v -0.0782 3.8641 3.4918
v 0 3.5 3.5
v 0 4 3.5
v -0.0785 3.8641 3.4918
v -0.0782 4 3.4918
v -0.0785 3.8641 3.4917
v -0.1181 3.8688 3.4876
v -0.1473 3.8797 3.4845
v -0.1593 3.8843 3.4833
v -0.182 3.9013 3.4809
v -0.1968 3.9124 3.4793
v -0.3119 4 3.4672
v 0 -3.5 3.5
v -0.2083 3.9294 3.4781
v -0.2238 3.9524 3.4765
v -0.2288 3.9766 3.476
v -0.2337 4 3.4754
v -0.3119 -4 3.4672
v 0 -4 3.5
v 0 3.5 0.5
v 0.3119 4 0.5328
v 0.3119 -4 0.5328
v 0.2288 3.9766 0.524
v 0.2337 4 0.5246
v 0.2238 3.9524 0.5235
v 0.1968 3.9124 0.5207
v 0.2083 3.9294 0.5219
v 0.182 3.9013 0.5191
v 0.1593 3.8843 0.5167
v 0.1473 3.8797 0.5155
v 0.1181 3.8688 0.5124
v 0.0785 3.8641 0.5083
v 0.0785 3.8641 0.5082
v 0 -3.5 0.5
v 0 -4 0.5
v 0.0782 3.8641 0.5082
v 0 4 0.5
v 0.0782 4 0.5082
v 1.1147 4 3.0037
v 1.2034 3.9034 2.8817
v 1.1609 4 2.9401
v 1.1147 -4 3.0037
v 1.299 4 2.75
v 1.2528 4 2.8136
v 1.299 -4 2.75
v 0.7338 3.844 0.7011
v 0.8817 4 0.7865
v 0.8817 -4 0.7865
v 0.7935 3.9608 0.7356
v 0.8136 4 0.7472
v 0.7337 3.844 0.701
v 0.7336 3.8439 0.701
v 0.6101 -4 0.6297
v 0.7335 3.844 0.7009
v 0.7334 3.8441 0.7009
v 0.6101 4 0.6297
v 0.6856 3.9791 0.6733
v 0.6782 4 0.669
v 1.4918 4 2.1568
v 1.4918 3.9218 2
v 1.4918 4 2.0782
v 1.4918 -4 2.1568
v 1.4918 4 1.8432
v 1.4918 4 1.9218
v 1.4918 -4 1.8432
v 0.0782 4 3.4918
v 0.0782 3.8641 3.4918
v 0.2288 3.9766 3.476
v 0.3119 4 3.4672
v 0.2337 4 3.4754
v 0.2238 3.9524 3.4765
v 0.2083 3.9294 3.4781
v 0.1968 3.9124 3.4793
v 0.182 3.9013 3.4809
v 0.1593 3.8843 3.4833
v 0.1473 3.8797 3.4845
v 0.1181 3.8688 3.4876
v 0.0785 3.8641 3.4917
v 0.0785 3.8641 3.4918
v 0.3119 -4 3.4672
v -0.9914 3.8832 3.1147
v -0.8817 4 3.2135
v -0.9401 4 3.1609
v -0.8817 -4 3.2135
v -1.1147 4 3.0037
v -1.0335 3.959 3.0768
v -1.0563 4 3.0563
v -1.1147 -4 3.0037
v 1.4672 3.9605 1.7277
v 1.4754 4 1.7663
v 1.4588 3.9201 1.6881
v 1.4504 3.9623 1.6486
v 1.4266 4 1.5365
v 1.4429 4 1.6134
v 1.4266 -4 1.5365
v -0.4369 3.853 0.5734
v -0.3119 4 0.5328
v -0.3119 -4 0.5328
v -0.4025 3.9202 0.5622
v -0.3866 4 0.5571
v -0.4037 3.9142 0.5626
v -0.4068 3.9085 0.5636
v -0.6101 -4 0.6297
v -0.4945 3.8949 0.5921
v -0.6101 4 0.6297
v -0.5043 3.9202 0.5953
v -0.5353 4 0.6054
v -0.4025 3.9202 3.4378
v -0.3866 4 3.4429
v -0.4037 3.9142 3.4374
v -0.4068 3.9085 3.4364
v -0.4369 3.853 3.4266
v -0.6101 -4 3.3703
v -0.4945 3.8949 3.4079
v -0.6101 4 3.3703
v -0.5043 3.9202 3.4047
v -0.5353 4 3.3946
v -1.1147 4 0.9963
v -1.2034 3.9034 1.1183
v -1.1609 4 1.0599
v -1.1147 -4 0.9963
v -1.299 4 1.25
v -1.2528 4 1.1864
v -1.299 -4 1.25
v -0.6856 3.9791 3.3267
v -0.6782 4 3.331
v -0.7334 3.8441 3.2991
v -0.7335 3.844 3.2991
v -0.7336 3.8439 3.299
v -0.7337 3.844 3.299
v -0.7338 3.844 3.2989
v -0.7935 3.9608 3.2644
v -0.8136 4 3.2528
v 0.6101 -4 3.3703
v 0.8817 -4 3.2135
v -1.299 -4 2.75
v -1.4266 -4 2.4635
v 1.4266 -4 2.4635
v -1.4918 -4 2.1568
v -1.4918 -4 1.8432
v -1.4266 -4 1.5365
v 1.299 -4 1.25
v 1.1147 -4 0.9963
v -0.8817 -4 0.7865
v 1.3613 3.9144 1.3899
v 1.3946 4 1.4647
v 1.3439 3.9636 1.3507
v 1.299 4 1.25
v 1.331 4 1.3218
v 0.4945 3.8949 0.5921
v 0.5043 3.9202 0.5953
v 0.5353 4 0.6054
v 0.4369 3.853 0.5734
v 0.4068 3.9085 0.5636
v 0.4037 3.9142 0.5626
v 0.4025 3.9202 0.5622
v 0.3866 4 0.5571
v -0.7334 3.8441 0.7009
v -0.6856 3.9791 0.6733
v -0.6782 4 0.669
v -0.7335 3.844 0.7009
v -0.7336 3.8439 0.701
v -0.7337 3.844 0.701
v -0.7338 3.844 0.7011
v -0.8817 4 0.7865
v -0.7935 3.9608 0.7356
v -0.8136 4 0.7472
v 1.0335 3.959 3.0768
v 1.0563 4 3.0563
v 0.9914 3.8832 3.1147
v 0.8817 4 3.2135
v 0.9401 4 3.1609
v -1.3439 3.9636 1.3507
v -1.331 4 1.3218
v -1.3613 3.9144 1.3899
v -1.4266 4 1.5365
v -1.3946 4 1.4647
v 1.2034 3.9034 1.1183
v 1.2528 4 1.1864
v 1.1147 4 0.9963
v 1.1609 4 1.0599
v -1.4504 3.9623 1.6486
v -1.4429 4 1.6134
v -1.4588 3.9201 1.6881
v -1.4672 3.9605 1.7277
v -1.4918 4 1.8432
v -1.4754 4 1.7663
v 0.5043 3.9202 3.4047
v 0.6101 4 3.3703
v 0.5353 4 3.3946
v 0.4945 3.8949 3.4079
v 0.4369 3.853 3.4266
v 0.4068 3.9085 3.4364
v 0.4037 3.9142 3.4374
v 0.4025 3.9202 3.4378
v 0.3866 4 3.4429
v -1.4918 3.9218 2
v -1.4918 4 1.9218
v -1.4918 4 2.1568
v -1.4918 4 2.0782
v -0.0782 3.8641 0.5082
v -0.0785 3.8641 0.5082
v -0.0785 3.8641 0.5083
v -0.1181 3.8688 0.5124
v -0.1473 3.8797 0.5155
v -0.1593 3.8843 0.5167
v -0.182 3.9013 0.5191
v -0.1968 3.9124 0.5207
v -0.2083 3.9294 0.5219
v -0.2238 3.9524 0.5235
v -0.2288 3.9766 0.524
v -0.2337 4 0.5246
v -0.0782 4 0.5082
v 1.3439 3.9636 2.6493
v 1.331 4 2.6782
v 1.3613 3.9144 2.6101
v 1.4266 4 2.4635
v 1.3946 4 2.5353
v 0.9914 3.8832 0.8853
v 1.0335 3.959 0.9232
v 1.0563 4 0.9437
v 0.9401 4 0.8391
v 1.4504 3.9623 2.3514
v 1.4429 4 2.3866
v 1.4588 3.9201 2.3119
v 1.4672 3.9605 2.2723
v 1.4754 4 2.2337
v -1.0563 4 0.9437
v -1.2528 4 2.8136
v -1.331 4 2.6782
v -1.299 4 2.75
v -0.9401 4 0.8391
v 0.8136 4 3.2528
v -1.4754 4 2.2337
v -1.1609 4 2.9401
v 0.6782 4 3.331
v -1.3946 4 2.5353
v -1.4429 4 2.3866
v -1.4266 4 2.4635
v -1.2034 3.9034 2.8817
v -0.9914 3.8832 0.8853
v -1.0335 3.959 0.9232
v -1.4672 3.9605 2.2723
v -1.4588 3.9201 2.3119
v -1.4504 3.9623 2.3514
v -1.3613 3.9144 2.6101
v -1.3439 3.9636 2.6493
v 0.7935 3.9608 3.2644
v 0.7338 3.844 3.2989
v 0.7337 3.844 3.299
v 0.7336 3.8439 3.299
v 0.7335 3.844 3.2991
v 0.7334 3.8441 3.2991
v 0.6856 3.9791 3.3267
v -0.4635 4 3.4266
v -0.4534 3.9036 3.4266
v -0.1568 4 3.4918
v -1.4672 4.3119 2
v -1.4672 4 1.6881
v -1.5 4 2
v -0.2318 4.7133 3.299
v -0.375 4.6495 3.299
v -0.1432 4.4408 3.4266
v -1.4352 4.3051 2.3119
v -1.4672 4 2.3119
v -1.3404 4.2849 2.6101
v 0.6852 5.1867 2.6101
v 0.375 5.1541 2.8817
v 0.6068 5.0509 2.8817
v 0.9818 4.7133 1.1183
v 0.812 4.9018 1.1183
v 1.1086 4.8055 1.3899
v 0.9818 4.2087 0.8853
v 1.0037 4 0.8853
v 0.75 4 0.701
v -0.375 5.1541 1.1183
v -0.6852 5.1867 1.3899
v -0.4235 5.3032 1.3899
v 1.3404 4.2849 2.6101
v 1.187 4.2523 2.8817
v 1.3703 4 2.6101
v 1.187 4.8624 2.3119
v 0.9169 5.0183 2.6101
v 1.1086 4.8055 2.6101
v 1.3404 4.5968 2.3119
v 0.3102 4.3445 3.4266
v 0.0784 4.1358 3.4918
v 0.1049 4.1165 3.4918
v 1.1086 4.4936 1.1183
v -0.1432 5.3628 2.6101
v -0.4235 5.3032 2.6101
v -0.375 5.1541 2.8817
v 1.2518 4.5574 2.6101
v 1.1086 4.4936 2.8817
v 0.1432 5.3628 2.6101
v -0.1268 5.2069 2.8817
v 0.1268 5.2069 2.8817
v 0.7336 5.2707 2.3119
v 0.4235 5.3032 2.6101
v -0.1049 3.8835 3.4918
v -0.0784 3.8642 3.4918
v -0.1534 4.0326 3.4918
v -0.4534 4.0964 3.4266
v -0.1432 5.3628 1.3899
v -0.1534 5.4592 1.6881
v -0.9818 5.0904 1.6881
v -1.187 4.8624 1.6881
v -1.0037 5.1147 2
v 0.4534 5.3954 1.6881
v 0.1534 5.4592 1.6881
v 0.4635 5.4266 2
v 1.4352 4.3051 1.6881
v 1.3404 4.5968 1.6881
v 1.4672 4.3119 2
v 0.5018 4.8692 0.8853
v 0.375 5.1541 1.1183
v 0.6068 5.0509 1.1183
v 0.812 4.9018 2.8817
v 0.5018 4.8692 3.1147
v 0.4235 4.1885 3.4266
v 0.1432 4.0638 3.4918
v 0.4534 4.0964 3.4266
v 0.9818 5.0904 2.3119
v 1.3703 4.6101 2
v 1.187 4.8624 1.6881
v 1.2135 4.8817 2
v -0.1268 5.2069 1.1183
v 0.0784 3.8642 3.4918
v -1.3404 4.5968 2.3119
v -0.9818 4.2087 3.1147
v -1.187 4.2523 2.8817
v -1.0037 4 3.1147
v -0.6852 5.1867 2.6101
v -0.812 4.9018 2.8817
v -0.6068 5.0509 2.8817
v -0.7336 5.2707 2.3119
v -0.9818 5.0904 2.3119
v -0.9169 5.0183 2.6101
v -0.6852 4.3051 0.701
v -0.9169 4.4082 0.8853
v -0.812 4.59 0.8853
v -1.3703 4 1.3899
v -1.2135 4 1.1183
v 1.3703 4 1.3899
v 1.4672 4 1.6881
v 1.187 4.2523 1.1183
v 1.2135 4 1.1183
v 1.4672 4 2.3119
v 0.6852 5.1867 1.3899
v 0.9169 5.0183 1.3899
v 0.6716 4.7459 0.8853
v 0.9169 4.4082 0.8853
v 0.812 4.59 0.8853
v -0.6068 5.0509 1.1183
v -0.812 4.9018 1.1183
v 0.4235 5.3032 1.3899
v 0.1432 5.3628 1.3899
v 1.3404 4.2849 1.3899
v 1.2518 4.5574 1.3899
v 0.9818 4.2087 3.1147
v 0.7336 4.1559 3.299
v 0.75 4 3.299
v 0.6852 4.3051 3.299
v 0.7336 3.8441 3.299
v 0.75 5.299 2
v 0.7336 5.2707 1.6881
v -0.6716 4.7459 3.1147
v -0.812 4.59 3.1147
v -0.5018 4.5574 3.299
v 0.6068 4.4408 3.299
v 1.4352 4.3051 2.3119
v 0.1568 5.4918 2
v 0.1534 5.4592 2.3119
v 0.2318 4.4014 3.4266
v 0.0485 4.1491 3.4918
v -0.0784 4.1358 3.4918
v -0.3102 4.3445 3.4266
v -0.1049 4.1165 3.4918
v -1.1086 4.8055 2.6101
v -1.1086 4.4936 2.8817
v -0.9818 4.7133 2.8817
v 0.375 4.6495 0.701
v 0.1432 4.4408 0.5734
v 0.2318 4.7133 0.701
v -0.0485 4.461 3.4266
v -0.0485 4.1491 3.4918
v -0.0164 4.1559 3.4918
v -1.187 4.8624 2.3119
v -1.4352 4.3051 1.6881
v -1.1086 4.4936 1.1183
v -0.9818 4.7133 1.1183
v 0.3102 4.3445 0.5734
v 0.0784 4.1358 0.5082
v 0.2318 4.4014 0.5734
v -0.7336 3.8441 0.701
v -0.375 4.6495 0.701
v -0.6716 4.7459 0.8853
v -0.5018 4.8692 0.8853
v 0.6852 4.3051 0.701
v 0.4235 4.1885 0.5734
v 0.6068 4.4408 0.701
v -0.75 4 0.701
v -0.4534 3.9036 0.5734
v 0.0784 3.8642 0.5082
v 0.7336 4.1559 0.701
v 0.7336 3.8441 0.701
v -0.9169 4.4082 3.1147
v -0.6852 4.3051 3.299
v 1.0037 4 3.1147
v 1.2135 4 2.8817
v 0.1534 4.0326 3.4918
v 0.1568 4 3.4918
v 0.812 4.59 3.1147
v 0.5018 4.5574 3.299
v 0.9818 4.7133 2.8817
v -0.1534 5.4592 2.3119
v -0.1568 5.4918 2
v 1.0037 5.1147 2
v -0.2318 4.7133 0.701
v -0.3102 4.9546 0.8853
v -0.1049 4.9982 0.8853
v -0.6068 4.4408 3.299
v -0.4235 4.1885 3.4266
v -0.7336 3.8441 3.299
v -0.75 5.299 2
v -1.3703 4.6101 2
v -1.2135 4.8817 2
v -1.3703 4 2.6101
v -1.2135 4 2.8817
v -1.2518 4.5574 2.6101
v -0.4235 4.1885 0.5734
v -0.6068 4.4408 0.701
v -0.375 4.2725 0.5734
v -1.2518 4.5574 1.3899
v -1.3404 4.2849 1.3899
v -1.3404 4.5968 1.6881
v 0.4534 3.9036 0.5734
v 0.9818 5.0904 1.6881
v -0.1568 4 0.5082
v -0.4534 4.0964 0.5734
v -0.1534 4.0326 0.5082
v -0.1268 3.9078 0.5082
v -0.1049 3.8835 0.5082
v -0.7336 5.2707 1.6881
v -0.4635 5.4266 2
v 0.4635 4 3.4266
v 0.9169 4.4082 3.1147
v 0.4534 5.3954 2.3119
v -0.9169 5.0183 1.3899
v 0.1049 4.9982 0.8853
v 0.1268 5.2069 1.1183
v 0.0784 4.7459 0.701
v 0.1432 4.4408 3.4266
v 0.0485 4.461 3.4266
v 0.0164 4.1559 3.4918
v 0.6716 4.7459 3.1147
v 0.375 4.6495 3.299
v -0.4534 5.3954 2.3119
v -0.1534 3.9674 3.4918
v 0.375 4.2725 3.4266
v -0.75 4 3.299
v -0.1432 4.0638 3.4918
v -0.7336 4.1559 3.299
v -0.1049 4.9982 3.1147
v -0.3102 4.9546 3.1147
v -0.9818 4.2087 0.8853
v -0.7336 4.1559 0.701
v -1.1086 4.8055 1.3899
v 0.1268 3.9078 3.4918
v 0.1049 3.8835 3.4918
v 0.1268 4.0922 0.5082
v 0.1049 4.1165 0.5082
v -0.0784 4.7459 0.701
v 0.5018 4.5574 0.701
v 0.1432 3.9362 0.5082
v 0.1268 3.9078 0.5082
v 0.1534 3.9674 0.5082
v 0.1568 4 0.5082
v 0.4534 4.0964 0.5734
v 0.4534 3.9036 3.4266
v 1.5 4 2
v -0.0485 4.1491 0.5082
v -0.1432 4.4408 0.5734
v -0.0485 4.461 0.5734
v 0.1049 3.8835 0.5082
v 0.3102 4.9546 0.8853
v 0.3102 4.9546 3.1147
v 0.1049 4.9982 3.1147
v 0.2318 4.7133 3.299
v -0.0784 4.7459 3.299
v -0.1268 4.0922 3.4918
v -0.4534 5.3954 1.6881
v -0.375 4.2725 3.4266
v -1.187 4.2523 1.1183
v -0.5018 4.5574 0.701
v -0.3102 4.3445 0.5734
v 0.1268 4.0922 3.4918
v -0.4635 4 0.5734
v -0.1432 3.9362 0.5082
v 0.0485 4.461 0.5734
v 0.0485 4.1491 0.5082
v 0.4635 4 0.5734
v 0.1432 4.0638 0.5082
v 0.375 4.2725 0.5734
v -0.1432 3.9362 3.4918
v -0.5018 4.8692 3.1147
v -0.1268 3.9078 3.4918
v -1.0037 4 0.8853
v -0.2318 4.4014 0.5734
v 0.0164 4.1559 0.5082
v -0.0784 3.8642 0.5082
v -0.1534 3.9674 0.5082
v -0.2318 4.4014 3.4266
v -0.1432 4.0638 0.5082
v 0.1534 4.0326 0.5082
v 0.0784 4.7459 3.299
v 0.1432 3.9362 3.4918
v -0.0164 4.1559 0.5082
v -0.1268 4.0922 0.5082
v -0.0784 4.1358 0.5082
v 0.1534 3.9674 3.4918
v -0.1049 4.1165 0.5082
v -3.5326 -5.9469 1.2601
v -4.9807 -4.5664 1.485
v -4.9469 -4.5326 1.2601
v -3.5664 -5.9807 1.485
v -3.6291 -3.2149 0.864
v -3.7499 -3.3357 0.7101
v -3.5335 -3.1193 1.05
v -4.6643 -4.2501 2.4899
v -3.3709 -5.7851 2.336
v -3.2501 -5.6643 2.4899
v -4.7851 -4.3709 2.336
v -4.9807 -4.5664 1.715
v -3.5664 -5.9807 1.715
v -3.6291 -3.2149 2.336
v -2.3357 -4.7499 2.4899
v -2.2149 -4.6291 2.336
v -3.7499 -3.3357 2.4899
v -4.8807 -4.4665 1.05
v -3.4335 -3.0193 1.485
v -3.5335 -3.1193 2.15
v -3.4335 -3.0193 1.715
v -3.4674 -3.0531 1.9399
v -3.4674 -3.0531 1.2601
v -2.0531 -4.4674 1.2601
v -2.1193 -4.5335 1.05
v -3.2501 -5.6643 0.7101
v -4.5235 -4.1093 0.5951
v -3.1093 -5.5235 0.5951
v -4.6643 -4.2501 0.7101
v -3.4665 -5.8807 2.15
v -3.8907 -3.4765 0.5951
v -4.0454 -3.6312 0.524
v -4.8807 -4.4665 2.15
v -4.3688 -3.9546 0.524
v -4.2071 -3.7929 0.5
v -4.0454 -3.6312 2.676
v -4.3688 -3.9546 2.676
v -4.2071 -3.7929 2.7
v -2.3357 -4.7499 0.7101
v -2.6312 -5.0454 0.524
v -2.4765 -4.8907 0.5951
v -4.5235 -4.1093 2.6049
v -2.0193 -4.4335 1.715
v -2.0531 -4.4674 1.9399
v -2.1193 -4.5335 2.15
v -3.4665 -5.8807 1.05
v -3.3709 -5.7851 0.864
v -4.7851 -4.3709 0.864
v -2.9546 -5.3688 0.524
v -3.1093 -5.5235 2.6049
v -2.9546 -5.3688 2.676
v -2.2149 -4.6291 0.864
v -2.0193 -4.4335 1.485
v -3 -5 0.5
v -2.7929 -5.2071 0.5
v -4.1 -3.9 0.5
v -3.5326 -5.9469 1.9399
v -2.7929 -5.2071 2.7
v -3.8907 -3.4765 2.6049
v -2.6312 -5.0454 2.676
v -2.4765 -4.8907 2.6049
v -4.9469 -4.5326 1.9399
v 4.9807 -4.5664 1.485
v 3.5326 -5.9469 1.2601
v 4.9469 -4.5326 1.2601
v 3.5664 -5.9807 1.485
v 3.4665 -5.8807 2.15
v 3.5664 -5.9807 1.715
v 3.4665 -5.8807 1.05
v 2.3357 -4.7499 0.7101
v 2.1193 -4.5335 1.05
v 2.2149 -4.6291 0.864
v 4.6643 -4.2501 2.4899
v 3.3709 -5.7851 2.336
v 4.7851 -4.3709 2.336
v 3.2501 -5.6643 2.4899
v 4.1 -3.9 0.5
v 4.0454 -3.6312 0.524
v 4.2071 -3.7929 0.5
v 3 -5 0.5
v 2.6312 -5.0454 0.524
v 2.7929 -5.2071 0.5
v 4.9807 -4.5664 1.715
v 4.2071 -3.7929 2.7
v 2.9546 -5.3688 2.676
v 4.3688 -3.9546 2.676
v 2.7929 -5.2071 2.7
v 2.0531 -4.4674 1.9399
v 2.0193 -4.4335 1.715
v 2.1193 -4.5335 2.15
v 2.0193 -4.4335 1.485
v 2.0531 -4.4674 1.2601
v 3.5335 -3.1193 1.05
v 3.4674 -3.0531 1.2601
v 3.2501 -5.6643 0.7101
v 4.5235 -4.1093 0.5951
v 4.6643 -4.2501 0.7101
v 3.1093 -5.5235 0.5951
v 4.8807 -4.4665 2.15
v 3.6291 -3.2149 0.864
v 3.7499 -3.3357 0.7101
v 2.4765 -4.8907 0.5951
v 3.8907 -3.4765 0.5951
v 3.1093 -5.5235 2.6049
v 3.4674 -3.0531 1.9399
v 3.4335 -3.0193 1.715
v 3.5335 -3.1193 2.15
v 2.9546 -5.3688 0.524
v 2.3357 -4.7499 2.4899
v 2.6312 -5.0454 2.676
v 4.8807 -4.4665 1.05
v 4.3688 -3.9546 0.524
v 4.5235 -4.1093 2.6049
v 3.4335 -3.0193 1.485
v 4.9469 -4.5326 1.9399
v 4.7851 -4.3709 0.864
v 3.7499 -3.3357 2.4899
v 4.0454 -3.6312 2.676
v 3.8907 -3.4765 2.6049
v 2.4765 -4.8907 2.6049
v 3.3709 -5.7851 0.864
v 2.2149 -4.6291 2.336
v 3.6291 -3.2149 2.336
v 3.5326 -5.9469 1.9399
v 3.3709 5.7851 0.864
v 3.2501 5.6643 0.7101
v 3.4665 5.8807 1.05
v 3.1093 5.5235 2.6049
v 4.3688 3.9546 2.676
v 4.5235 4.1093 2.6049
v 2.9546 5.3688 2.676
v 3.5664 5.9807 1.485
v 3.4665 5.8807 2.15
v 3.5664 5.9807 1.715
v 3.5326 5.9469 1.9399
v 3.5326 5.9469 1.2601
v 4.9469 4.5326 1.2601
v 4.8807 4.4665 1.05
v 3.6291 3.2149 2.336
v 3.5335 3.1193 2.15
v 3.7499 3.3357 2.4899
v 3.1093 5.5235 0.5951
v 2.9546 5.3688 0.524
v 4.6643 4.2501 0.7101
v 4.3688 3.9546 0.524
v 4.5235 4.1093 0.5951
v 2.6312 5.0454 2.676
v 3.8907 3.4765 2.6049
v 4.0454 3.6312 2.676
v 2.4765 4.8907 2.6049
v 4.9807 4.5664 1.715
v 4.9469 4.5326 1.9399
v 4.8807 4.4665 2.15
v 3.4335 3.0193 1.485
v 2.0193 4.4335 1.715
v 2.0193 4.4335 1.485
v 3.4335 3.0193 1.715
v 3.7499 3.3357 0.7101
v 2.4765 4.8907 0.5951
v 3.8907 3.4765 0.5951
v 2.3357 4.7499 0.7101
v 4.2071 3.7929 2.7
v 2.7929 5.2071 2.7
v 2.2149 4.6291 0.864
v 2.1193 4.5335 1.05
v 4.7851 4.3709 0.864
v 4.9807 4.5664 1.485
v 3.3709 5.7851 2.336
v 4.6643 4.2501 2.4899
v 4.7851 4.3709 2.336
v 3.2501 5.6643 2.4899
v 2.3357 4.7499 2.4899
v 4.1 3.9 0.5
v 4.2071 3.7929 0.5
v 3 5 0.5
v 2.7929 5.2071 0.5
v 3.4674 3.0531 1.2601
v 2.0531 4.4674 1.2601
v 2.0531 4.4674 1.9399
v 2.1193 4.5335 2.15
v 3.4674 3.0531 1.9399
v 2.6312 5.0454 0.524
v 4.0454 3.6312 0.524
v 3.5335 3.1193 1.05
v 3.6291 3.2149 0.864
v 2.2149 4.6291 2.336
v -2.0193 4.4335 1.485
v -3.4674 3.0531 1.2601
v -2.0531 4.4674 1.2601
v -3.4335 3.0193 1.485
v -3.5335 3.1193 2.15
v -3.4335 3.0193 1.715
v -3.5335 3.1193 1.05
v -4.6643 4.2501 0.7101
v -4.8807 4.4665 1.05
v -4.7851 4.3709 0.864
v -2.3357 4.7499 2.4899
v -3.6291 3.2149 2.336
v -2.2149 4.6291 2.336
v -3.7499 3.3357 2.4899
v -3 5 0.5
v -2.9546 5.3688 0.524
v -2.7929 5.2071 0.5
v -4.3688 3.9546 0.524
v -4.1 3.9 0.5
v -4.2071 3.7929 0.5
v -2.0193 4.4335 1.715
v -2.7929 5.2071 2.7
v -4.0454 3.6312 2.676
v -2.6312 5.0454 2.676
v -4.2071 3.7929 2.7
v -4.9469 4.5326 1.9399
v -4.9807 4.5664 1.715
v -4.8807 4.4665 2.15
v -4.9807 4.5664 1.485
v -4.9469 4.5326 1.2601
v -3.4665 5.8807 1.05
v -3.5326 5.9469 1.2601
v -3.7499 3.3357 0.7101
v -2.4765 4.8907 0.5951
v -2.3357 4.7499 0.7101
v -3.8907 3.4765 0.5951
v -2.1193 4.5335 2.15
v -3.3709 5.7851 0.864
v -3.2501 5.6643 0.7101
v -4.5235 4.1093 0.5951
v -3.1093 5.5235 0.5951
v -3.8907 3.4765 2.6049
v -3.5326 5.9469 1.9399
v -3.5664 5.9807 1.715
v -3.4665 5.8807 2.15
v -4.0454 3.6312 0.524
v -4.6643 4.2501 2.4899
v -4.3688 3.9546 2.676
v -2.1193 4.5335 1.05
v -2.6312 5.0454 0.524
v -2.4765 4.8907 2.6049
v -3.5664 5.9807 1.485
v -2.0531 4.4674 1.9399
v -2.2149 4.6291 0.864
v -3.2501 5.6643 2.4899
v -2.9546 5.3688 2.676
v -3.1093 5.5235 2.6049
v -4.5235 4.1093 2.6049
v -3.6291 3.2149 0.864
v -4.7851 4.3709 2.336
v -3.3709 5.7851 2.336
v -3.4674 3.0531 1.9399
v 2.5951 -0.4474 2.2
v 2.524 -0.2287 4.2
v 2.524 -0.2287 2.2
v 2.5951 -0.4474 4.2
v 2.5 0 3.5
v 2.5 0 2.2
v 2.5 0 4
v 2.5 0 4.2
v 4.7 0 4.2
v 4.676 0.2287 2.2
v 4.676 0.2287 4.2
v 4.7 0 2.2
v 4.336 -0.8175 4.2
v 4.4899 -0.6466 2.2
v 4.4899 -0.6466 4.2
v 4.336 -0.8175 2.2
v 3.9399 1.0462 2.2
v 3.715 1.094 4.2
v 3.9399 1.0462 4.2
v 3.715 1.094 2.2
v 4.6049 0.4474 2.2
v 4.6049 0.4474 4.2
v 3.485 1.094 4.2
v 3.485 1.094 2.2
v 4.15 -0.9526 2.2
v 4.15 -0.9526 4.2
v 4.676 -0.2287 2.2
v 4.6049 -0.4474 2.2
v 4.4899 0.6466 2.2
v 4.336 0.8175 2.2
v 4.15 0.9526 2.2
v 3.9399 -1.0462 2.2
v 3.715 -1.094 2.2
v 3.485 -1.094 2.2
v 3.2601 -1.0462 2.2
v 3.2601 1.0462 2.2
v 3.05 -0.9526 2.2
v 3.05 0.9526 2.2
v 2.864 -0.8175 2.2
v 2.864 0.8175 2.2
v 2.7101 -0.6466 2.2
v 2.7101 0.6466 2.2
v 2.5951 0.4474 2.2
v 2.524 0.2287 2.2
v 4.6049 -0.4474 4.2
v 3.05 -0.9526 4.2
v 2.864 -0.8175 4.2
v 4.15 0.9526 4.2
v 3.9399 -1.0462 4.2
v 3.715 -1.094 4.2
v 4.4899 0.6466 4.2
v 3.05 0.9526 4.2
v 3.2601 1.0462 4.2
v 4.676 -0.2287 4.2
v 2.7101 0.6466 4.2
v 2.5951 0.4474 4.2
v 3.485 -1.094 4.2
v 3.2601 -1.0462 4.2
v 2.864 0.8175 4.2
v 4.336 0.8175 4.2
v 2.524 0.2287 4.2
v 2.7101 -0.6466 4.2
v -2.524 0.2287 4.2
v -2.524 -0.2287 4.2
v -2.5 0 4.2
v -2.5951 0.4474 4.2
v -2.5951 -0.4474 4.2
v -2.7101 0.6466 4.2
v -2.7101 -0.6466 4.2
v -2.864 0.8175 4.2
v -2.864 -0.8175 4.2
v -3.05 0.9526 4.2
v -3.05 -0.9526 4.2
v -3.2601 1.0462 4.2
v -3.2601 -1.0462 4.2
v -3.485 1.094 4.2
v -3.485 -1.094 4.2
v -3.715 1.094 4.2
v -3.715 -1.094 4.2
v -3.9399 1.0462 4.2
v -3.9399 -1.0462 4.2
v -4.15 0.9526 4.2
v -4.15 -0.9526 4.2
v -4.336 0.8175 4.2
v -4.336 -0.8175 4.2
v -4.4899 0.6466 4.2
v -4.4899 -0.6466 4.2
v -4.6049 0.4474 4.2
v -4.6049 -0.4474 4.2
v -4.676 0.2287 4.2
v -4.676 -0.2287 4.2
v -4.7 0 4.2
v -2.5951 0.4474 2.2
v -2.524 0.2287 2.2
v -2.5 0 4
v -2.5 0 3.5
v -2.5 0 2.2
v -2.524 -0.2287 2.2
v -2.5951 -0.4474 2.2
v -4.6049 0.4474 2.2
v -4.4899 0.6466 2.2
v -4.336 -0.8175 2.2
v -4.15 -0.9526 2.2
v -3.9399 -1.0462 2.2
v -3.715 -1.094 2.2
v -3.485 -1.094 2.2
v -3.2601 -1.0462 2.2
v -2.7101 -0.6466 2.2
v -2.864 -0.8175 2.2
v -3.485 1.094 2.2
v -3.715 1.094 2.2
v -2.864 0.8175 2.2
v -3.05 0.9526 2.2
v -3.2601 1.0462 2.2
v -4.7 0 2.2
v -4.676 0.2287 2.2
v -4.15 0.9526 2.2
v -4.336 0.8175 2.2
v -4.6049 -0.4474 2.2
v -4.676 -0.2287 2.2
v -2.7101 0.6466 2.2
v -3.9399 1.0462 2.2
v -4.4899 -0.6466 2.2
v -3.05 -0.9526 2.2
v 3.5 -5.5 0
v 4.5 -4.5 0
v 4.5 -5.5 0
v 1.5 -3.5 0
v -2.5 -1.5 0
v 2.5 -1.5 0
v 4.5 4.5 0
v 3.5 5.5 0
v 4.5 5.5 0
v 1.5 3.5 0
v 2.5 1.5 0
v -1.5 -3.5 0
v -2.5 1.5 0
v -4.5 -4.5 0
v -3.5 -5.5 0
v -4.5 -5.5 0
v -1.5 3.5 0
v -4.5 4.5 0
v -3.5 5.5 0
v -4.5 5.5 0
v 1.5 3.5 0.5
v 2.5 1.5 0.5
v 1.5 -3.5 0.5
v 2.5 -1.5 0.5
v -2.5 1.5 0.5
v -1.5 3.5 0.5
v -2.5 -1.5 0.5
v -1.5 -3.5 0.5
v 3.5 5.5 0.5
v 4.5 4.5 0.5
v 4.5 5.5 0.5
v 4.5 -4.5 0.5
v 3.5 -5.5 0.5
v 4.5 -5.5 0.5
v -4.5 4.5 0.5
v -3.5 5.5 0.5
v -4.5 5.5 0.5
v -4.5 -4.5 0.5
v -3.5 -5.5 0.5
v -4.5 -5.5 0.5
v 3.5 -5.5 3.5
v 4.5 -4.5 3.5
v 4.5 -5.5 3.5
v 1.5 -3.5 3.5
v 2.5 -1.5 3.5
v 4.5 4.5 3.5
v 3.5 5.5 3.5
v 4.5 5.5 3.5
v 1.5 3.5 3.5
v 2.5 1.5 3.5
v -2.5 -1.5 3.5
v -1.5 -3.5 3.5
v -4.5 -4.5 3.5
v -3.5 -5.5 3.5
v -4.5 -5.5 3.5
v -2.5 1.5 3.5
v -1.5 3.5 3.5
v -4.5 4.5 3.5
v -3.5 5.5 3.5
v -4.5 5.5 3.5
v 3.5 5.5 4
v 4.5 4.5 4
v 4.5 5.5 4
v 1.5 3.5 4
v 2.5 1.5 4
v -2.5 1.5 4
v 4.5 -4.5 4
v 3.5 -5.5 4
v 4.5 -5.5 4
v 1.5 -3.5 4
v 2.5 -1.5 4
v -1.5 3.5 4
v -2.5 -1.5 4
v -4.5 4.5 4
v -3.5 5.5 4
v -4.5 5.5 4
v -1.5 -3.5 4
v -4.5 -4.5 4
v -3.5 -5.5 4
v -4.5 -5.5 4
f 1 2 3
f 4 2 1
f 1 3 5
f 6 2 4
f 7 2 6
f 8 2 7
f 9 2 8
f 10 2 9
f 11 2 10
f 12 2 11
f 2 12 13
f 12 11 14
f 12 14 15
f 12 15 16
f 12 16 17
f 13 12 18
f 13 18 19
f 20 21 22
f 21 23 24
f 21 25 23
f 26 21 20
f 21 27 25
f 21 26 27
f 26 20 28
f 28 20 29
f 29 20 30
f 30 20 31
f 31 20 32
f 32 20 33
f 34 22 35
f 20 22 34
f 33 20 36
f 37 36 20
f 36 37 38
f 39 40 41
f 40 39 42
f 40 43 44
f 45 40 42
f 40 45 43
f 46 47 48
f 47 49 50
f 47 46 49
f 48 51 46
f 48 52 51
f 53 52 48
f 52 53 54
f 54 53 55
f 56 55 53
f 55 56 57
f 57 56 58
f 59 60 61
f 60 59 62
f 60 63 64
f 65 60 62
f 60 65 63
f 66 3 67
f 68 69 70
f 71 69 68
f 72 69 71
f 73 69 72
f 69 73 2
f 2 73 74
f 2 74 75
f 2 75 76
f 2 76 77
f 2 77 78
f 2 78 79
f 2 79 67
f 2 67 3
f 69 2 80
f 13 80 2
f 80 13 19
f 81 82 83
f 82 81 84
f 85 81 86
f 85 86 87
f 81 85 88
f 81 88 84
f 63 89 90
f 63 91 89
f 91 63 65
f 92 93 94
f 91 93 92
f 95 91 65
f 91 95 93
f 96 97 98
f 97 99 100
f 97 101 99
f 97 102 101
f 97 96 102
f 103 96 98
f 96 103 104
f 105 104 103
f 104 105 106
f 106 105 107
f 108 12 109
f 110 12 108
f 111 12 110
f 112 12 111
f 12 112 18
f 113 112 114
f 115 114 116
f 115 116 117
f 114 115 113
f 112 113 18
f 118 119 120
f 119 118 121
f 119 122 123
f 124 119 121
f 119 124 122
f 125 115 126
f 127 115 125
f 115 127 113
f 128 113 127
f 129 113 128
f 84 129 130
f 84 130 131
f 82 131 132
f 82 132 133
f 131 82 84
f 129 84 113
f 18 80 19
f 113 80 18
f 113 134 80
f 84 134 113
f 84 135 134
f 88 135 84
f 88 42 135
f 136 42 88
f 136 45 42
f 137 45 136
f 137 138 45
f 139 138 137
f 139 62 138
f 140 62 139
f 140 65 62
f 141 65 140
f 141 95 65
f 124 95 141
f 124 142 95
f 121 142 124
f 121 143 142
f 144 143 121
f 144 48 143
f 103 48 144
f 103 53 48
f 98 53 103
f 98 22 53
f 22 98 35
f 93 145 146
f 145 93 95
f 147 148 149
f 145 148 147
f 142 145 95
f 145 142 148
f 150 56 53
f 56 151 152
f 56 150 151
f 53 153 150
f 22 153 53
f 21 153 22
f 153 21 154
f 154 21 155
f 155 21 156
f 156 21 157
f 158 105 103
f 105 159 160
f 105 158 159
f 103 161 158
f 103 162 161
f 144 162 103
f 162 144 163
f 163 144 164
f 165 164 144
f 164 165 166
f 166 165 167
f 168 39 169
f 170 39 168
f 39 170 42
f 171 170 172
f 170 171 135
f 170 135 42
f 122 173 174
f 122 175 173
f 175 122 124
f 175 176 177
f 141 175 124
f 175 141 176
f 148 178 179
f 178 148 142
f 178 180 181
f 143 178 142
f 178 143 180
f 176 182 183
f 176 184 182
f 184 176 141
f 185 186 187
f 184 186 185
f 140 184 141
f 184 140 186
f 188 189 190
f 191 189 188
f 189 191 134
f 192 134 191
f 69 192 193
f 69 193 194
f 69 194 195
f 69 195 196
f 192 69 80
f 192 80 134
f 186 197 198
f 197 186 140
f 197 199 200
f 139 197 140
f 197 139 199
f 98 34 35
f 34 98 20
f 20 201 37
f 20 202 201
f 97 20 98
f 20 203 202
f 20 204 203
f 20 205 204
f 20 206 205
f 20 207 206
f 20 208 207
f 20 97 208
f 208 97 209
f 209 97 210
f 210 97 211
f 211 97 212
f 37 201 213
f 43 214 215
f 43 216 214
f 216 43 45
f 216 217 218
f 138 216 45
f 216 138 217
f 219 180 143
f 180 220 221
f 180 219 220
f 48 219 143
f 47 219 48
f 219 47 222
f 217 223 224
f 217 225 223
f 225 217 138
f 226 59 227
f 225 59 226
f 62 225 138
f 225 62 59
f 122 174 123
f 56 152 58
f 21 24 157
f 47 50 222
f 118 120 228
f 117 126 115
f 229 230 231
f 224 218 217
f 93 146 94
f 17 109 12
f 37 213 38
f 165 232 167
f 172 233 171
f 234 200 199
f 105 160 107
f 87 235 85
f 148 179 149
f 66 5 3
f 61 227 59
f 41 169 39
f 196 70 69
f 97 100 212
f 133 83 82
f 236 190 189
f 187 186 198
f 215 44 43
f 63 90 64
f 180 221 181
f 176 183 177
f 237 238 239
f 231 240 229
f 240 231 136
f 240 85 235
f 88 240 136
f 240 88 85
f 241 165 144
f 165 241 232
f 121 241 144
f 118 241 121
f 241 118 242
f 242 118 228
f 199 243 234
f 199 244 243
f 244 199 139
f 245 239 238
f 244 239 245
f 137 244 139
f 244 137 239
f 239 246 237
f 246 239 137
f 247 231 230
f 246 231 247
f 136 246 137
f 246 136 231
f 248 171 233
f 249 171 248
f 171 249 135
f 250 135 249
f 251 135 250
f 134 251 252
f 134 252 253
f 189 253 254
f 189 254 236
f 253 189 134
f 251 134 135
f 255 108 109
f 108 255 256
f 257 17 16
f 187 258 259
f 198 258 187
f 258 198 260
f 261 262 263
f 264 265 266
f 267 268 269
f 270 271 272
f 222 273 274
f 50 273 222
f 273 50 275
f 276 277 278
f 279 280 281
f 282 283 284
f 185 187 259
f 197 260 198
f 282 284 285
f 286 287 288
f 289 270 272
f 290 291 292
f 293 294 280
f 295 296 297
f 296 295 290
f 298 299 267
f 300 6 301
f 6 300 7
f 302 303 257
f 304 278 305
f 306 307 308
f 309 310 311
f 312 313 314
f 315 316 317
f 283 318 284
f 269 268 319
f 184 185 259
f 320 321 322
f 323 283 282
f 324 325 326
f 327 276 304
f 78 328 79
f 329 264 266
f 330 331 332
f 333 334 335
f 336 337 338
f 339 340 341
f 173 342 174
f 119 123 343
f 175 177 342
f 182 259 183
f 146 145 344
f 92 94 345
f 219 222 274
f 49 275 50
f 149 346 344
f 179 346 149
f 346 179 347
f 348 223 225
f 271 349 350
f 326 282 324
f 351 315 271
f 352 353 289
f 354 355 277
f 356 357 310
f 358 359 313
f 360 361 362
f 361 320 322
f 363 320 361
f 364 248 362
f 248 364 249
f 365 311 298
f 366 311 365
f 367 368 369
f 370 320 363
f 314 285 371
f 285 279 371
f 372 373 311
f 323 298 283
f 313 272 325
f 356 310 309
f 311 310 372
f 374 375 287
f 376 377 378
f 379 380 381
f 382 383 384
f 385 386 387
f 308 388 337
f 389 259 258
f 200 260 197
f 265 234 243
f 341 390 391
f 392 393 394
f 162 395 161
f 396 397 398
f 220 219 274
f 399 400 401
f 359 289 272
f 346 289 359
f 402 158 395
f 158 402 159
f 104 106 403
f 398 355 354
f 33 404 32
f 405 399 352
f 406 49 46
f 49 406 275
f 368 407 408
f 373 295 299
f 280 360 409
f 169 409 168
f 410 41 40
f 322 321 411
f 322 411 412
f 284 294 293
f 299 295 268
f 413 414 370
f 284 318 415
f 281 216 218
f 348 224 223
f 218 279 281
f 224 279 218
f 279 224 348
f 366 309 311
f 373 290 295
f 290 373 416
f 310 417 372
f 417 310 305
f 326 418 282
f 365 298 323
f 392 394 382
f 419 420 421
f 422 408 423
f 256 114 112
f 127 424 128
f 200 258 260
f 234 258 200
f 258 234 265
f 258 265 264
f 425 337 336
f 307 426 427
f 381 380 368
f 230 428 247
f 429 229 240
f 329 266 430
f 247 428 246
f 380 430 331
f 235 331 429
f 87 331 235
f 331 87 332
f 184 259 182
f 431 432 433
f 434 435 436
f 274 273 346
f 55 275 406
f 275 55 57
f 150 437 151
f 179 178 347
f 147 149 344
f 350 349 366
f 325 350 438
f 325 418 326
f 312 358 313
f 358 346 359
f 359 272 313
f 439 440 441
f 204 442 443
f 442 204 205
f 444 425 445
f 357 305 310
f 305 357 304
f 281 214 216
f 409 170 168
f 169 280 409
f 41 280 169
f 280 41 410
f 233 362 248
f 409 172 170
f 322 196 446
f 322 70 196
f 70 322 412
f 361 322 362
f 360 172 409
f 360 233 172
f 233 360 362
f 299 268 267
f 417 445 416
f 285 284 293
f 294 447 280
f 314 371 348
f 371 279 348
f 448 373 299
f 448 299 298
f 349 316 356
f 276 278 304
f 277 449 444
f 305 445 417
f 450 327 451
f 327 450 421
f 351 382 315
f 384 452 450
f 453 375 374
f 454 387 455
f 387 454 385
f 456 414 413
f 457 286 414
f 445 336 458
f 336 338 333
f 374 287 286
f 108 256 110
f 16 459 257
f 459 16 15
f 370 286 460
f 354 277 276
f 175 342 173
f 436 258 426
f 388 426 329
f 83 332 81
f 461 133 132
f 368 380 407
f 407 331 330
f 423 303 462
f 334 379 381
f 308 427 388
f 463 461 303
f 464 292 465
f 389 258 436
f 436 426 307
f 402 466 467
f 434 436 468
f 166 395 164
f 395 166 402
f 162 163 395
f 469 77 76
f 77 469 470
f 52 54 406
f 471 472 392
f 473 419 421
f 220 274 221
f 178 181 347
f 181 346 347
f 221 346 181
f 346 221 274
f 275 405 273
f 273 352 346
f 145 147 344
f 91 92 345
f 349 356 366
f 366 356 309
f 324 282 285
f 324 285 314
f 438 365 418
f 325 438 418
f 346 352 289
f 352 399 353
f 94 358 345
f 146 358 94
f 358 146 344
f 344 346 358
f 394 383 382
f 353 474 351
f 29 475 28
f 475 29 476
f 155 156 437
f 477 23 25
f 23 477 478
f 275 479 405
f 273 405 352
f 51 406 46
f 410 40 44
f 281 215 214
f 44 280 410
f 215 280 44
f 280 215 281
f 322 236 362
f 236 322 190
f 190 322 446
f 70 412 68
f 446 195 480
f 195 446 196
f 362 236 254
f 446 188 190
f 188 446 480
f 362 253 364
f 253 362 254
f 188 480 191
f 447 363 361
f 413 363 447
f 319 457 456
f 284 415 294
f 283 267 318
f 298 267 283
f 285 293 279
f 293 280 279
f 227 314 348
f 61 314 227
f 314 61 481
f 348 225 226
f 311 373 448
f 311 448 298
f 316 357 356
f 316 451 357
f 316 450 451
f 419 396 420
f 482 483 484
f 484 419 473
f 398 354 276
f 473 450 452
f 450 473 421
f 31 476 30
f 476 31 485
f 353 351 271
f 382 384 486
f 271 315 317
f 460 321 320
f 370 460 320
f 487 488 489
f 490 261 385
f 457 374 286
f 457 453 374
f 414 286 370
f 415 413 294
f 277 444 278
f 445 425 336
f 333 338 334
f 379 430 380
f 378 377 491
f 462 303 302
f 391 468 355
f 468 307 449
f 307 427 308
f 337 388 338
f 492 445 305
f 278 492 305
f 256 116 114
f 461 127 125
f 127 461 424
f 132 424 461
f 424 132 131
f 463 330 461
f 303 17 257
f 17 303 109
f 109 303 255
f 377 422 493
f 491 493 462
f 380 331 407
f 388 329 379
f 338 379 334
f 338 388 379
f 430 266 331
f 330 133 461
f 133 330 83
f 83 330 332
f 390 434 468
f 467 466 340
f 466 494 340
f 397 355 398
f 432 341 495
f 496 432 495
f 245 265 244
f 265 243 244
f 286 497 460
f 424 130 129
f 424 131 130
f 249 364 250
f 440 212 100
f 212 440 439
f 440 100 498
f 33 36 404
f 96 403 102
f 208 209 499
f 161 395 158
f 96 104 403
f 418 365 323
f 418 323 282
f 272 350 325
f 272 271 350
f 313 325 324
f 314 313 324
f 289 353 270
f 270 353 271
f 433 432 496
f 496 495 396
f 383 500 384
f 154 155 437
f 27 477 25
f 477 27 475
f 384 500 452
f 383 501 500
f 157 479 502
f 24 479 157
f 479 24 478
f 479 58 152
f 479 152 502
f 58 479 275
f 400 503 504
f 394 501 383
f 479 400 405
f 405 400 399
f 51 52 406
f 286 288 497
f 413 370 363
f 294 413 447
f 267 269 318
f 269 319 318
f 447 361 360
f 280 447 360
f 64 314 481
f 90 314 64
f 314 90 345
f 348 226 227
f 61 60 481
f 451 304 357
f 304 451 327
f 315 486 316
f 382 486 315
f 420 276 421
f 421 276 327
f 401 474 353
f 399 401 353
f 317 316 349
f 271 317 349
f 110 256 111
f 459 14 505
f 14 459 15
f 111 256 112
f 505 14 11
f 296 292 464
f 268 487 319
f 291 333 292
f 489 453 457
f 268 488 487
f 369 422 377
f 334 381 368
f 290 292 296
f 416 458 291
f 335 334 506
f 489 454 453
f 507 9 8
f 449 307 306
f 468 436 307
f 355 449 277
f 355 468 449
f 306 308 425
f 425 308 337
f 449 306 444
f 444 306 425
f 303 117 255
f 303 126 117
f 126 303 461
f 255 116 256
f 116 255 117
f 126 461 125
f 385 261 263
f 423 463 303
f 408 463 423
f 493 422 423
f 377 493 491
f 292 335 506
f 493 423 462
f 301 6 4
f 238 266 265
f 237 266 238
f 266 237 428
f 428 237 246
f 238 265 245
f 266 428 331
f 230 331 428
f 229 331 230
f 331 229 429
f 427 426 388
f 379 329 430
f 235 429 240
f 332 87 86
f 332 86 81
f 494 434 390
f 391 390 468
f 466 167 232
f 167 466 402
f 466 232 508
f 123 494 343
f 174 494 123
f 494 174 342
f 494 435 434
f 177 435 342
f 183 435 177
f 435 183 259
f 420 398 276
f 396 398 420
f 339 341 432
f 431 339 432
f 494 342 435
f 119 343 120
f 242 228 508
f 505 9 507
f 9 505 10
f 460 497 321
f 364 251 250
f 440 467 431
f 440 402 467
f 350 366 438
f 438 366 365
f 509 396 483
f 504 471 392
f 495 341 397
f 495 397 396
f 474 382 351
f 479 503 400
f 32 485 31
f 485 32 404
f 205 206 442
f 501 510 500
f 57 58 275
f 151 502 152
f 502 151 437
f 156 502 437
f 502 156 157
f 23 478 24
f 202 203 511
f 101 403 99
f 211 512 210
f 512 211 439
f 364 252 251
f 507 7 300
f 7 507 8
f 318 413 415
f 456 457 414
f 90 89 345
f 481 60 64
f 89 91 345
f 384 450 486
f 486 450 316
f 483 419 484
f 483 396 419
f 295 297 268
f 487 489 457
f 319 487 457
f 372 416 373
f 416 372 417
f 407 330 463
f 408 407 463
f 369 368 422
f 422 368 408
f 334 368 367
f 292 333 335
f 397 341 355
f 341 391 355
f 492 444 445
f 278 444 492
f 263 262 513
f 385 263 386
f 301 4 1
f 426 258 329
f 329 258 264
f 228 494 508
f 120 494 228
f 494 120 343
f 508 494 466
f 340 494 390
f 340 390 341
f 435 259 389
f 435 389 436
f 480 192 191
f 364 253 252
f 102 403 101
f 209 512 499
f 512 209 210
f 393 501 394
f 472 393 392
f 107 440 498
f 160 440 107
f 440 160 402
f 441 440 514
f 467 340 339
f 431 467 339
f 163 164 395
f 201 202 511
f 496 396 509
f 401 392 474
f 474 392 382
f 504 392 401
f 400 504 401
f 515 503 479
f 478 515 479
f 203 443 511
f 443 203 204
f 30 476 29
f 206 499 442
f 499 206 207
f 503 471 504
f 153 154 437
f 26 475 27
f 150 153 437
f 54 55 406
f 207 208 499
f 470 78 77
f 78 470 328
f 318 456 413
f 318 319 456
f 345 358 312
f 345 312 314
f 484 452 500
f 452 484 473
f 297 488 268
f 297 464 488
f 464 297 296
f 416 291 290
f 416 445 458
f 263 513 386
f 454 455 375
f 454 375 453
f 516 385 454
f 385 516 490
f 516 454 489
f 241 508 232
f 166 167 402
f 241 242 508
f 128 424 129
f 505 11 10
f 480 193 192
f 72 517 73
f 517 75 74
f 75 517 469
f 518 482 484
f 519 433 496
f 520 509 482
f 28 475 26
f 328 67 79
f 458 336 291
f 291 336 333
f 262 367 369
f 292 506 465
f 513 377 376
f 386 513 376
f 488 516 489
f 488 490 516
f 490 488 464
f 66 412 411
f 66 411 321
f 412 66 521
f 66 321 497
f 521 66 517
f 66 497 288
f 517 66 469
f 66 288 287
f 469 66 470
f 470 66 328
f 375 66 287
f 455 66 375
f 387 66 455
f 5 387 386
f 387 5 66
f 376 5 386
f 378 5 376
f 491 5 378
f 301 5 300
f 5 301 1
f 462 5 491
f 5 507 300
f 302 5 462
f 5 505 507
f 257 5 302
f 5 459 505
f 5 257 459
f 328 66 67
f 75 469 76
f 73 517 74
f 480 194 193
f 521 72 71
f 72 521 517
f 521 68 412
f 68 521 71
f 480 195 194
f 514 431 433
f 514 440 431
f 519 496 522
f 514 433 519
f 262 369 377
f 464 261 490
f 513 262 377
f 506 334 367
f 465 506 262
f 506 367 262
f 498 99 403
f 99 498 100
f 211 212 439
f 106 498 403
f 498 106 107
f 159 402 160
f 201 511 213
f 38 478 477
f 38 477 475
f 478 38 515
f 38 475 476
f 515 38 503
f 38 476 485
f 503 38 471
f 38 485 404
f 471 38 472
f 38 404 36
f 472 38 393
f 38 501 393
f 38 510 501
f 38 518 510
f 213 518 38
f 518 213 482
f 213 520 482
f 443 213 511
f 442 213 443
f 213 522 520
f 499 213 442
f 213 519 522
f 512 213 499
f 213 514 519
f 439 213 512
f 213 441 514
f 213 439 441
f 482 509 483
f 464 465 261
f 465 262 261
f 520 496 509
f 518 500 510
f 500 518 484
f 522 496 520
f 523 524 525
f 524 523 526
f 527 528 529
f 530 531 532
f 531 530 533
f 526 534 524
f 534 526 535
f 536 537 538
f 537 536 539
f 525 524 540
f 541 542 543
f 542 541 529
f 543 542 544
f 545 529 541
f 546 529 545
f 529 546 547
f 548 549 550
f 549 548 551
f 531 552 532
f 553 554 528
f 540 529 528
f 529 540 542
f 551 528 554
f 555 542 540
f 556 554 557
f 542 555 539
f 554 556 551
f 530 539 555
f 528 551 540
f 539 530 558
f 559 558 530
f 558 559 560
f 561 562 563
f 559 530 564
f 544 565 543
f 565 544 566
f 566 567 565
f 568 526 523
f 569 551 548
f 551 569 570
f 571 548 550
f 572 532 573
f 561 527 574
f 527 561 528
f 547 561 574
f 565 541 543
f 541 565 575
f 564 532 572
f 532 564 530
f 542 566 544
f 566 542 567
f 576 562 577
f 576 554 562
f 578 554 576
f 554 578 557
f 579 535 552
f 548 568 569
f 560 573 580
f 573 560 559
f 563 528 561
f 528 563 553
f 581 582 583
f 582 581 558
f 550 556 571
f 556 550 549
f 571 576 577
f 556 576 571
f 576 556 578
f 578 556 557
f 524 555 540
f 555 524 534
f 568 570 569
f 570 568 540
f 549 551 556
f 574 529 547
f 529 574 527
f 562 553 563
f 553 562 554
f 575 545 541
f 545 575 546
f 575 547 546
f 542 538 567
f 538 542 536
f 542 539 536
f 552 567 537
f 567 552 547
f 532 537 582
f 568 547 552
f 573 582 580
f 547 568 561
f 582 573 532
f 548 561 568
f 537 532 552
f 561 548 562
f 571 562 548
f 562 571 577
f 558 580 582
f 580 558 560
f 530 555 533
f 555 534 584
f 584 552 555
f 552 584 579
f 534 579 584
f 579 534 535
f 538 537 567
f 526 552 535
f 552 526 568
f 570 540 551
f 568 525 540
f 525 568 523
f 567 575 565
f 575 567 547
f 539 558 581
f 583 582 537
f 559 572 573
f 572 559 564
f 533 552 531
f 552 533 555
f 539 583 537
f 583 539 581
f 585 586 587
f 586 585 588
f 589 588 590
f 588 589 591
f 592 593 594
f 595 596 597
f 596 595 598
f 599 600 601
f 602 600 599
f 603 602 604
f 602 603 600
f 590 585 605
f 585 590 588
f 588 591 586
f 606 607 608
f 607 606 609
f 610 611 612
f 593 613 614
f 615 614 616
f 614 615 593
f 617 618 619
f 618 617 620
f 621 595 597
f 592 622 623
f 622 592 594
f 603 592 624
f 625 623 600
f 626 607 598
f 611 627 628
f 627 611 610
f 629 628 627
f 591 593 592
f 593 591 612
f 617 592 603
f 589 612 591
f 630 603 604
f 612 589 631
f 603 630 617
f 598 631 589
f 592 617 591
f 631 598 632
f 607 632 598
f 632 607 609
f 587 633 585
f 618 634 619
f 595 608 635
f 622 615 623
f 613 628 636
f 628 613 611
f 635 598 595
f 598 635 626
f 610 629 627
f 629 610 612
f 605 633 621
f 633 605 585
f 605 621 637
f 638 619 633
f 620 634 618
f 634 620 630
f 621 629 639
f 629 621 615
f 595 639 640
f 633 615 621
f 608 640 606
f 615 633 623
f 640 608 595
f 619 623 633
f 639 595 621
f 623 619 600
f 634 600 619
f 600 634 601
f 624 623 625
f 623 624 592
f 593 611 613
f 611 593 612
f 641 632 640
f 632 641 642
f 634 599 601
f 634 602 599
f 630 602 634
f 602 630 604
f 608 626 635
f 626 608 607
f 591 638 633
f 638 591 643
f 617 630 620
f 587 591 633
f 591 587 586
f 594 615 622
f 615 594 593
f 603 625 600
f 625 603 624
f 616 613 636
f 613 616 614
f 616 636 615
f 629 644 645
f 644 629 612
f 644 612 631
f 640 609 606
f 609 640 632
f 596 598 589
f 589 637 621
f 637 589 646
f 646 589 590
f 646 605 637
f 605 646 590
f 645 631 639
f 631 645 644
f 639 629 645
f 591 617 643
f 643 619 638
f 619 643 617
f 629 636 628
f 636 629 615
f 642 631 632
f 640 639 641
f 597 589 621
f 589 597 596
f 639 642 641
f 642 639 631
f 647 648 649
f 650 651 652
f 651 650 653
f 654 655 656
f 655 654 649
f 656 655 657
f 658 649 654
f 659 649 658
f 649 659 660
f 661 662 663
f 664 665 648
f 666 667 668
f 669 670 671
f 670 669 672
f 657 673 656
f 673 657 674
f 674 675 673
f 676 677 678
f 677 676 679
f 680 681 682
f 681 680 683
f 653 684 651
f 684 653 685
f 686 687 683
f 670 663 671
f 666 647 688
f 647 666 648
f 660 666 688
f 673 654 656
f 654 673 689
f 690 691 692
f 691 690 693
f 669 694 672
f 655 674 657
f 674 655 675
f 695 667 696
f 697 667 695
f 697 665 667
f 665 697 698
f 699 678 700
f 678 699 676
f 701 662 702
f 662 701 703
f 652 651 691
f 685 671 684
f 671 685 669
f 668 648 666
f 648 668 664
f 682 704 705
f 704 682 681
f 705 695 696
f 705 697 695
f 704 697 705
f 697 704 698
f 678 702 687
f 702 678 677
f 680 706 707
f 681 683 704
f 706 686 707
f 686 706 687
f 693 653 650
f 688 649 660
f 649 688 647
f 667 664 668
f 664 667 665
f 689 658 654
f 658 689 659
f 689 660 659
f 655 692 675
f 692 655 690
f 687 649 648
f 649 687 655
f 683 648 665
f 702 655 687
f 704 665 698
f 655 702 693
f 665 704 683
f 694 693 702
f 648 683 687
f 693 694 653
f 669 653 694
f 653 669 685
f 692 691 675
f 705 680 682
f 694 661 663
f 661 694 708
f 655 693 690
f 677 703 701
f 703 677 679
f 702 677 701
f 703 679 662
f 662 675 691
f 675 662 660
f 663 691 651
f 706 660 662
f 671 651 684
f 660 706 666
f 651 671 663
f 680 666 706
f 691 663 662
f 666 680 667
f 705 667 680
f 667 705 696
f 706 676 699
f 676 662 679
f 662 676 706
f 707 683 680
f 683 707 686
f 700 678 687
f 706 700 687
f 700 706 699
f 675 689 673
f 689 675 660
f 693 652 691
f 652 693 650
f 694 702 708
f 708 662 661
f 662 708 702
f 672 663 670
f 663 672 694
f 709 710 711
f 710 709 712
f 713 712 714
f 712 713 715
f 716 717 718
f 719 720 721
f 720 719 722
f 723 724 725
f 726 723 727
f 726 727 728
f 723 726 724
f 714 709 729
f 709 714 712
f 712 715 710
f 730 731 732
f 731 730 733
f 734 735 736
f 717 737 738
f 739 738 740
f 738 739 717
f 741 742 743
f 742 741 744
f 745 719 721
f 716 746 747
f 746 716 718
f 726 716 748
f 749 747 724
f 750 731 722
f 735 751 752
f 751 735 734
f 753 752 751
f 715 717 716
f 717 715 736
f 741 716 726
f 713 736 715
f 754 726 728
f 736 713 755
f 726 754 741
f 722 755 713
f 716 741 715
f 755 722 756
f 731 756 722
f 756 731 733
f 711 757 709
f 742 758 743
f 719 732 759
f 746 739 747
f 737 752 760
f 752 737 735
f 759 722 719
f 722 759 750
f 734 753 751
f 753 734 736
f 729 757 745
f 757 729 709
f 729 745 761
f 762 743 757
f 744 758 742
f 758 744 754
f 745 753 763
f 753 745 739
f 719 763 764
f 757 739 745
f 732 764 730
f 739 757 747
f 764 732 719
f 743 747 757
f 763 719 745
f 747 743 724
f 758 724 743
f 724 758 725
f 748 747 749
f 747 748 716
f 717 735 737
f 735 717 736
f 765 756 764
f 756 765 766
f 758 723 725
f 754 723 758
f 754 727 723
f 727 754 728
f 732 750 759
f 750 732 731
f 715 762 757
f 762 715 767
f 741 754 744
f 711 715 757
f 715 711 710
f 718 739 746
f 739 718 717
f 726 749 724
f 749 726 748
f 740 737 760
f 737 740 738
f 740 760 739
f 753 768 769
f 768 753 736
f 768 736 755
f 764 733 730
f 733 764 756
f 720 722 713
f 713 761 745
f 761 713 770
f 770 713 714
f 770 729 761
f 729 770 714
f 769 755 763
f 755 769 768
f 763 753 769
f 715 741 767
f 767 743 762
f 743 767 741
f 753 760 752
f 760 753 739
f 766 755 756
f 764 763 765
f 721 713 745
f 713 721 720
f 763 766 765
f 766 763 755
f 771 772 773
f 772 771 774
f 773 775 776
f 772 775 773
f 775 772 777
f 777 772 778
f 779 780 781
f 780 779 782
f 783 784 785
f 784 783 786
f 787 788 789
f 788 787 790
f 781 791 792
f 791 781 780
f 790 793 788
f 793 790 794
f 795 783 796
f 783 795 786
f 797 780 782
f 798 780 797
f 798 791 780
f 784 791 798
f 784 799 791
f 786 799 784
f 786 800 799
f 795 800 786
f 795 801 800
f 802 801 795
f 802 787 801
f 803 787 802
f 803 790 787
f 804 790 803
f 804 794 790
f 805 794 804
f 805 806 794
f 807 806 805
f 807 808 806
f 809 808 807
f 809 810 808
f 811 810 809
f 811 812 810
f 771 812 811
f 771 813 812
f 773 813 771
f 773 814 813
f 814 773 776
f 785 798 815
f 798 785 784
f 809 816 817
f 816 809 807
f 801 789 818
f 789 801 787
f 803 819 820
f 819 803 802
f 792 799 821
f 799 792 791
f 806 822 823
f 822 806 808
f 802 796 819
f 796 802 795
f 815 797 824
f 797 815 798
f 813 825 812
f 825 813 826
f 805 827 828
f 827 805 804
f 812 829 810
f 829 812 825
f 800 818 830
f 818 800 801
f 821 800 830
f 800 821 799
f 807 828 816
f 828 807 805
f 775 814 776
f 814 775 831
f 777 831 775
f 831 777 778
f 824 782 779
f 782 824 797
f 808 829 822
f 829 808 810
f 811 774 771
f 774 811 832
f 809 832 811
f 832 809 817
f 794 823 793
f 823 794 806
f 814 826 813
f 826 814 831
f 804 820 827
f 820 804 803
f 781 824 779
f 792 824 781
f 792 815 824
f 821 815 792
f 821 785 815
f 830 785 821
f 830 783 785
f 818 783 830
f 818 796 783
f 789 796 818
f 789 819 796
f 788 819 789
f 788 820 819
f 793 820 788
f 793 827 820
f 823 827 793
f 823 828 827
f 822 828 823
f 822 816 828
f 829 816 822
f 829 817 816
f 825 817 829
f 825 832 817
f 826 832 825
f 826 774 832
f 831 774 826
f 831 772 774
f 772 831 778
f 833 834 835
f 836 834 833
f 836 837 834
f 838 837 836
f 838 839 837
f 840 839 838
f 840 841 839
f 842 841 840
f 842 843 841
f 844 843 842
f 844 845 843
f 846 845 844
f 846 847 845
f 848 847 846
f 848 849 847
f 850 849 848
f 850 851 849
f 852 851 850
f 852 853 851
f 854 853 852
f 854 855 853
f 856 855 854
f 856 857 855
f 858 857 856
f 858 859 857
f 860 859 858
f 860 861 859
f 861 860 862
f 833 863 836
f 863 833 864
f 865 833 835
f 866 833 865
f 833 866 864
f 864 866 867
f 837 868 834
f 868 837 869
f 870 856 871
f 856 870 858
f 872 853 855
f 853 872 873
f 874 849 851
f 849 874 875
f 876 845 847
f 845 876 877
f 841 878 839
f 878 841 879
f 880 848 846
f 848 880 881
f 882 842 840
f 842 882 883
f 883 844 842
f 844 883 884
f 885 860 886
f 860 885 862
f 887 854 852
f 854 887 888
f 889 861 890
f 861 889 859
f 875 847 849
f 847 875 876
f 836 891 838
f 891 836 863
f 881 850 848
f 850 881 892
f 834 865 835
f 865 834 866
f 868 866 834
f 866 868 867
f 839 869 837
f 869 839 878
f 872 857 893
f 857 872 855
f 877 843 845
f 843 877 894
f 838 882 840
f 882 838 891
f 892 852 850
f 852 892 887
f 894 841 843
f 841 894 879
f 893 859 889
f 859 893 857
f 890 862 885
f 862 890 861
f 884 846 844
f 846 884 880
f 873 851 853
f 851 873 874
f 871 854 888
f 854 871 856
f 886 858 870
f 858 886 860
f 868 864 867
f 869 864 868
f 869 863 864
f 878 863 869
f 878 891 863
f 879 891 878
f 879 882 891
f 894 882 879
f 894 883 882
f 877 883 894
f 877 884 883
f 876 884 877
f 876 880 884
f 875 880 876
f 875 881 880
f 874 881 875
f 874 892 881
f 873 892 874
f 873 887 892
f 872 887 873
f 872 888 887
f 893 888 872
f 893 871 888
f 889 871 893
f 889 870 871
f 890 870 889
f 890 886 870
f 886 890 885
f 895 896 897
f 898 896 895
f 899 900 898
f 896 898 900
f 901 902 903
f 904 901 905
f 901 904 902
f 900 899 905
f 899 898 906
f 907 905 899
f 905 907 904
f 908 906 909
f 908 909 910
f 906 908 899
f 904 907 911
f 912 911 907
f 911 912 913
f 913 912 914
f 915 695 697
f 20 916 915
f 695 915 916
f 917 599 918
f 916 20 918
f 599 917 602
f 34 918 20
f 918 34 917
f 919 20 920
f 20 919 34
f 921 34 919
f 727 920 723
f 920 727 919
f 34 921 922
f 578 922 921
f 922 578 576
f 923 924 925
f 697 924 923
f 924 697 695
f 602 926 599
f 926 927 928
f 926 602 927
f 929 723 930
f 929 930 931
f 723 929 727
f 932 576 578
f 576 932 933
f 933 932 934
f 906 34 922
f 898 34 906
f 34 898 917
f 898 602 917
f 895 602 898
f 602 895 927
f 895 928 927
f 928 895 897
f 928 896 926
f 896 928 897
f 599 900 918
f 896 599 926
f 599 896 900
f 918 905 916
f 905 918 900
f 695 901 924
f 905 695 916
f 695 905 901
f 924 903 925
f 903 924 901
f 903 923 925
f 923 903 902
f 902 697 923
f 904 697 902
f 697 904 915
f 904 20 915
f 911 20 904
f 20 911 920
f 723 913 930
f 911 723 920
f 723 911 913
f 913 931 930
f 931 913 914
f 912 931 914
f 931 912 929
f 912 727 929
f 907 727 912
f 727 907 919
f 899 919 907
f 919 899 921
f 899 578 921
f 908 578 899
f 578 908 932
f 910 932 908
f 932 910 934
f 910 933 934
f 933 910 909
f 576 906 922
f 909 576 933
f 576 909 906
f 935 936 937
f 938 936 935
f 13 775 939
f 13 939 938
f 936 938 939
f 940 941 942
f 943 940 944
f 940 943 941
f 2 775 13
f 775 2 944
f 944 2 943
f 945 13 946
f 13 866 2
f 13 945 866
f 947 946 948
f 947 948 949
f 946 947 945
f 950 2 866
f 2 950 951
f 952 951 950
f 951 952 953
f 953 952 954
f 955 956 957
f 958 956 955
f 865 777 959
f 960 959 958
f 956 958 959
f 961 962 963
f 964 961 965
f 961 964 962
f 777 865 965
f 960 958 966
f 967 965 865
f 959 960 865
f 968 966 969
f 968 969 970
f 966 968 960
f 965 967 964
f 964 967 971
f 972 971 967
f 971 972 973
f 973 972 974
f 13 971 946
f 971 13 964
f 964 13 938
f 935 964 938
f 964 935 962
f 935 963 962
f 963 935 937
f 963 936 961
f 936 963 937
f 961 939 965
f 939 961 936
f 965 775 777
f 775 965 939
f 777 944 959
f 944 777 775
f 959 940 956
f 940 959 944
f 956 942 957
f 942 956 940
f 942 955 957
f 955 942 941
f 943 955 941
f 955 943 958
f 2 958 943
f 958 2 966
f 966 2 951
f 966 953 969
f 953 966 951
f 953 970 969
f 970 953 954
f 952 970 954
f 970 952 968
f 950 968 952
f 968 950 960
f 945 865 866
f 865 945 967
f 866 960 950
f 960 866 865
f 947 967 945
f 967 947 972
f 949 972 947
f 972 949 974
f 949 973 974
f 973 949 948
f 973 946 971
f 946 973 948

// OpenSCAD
// NOTE: since color does not render, you may wish to export to PNG from preview
// file units are nonexistent

// set viewport characteristics
$vpr = [66, 0, 141];
$vpt = [0, 0, 0.75];
$vpd = 32;

// shape of frame base polygon
vertices = [[0, 0], [1, 0], [3, 2], [6, 2], [8, 0], [9, 0], [9, 1], [7, 4], [7, 7], [9, 10], [9, 11], [8, 11], [6, 9], [3, 9], [1, 11], [0, 11], [0, 10], [2, 7], [2, 4], [0, 1]];

// segment length resolution for arcs
$fs = 0.1;

// colors
plate_color = [1, 1, 1];  // white
tube_color = [0.97, 0.82, 0.60];  // orange
thruster_color = [0.60, 0.83, 0.97];  // blue

// some design parameters (but not all)
plate_thickness = 0.5;
tube_rad = 1.5;
tube_len = 8;
thruster_rad = 1.1;
thruster_len = 2;
shift_x = -4.5;  // half of plate width
shift_y = -5.5;  // half of plate length

// frame plate bottom
color(plate_color)
  translate([shift_x, shift_y, 0])
    linear_extrude(height=plate_thickness)
      polygon(vertices);

// tube
color(tube_color) {
  translate([0, 0, plate_thickness + tube_rad])
    rotate([90, 90, 0])
      cylinder(h=tube_len, r1=tube_rad, r2=tube_rad, center=true);
  translate([0, 0.5 * tube_len, plate_thickness + tube_rad])
    sphere(r=tube_rad);
}

// frame plate top
color(plate_color)
  translate([shift_x, shift_y, plate_thickness + 2 * tube_rad])
    linear_extrude(height=plate_thickness)
      polygon(vertices);

// horiztonal thrusters
for (coords = [[1, 1, -45], [8, 1, 45], [8, 10, -45], [1, 10, 45]]) {
  color(thruster_color)
    translate([coords[0] + shift_x, coords[1] + shift_y, thruster_rad + plate_thickness])
      rotate([0, 90, coords[2]])
        cylinder(h=thruster_len, r1=thruster_rad, r2=thruster_rad, center=true);
}

// vertical thrusters
target = 0.2;  // offset from top
for (x = [2.5 + thruster_rad, -(2.5 + thruster_rad)]) {
  color(thruster_color)
    translate([x, 0, 2 * plate_thickness + 2 * tube_rad + target - 0.5 * thruster_len])
      cylinder(h=thruster_len, r1=thruster_rad, r2=thruster_rad, center=true);
}
